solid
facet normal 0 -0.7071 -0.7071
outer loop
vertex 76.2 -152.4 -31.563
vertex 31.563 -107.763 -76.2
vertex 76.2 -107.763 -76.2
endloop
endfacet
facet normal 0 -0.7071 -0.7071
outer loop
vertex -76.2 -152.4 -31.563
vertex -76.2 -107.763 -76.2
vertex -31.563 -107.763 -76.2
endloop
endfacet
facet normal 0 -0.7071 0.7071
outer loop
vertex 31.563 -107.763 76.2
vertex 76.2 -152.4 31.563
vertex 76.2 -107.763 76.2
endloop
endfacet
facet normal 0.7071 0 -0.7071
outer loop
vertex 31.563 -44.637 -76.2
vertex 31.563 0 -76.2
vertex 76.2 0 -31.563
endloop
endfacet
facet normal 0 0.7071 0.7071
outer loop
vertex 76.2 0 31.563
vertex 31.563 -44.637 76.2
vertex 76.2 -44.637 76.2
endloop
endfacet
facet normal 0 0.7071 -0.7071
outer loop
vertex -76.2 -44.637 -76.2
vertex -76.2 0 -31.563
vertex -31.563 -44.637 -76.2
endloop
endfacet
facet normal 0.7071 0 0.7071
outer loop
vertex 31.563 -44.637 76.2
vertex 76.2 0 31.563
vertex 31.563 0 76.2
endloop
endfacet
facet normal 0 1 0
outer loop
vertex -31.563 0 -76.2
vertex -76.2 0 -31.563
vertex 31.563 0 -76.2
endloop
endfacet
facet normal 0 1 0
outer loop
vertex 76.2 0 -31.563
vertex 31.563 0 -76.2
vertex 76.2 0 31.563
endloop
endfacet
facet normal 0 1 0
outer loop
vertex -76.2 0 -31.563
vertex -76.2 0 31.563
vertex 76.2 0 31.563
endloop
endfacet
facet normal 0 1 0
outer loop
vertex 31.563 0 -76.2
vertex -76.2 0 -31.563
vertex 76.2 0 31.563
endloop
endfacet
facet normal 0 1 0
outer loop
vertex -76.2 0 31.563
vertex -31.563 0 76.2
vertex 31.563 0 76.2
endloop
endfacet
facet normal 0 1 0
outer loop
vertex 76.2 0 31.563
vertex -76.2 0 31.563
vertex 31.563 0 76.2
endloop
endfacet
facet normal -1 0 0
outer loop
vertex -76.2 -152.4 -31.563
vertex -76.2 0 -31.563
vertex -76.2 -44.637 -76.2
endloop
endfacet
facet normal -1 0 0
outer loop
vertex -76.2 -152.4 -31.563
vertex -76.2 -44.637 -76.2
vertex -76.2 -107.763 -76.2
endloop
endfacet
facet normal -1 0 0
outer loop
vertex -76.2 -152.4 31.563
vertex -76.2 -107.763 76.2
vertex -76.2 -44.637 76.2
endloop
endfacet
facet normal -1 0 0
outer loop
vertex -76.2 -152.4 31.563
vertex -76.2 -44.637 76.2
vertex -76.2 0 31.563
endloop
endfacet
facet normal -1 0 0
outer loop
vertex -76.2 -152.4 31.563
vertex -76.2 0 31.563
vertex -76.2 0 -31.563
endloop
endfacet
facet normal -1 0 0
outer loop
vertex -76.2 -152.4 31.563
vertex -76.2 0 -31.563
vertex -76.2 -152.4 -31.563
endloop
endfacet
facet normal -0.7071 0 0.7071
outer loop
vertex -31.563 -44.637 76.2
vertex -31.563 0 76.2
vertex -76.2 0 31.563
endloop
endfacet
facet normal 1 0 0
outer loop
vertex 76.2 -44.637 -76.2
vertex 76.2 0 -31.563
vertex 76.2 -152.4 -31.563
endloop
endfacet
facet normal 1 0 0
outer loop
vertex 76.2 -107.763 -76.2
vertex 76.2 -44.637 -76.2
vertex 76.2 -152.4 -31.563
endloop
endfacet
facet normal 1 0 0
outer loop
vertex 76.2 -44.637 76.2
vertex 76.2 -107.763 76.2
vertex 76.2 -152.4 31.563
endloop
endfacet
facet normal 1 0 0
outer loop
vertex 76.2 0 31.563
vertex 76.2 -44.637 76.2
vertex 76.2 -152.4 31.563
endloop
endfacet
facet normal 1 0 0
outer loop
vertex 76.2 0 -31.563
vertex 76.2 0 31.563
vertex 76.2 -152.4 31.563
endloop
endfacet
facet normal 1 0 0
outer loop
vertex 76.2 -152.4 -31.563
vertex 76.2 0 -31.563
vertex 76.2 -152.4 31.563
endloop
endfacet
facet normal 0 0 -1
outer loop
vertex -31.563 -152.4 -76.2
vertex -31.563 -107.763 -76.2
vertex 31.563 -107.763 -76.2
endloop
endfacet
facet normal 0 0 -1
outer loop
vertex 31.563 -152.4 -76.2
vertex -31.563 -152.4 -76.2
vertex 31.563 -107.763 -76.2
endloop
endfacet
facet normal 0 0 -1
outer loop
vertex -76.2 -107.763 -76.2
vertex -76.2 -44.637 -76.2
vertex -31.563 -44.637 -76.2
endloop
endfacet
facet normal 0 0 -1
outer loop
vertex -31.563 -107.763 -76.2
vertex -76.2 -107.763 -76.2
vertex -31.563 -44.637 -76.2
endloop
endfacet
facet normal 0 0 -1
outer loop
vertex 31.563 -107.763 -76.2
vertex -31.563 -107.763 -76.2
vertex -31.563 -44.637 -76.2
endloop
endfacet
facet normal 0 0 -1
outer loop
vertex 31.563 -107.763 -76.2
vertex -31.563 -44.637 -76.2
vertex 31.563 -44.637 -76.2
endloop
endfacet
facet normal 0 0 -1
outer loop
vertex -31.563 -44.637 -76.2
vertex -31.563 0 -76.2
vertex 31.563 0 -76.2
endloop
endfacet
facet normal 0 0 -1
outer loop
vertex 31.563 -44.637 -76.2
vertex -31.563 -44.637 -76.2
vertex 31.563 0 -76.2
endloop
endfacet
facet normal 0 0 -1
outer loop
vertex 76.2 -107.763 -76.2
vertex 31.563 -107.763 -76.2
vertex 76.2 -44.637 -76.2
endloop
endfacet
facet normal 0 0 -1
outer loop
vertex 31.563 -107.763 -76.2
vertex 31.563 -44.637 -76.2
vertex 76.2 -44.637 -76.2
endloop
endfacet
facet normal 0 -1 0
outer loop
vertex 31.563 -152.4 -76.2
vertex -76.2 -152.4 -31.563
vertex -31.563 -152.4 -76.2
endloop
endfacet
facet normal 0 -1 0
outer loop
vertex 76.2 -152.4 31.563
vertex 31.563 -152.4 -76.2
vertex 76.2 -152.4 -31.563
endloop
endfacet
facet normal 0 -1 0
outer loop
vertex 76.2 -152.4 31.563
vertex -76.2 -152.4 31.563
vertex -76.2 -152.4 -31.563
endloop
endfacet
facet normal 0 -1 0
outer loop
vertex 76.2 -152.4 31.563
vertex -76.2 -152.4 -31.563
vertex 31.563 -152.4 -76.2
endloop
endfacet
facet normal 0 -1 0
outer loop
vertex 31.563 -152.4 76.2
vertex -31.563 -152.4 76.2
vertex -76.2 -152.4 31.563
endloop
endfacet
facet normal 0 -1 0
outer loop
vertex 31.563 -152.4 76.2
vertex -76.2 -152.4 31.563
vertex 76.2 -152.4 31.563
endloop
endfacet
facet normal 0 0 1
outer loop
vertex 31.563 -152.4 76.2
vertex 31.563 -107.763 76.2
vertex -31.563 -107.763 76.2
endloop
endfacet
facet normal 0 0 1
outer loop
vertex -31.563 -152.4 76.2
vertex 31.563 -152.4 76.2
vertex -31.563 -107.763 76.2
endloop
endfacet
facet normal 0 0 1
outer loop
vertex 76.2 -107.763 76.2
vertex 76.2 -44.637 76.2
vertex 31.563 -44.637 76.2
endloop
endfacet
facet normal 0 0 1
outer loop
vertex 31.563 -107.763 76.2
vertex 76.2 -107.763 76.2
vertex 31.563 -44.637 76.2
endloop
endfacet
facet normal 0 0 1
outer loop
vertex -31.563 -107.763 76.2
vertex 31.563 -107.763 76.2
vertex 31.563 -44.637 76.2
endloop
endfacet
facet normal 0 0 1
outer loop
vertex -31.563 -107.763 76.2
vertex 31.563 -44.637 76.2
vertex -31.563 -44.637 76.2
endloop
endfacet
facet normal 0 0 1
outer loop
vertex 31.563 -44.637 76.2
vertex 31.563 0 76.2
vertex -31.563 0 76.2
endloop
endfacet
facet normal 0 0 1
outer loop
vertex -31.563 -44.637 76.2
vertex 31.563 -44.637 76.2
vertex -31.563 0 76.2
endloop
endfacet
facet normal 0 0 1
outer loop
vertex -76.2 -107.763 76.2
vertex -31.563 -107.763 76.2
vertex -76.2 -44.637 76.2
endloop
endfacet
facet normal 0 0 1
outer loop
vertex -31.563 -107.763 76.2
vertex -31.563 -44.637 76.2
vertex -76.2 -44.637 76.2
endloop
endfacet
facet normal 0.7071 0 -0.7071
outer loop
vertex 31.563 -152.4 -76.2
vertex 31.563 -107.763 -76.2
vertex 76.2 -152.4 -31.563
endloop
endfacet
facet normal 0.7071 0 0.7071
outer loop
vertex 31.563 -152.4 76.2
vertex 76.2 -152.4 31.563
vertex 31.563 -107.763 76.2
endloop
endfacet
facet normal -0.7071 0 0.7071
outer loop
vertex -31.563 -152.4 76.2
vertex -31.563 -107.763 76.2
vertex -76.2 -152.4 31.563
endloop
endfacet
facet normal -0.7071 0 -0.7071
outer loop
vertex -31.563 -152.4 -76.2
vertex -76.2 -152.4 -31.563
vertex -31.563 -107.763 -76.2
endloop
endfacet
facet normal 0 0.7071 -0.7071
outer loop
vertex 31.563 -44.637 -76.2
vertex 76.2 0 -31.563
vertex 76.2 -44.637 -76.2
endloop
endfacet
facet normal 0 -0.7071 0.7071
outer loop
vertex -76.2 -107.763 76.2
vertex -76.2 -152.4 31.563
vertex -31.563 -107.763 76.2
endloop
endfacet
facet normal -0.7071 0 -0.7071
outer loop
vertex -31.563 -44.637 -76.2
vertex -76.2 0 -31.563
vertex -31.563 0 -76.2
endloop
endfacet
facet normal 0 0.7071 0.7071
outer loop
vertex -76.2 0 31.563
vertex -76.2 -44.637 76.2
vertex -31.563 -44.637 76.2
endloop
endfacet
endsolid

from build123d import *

# Parameters (mm, degrees)
F1_DEPTH = 152.4
F2_W     = 76.2
F2_H     = 31.5630734528
F3_DEPTH = 152.4


with BuildPart() as f1:
    # F0 (on Front) → F1 (new body)
    with BuildSketch(Plane.XZ):
        Polygon((-31.5630734528, -76.2), (31.5630734528, -76.2), (76.2, -31.5630734528), (76.2, 31.5630734528), (31.5630734528, 76.2), (-31.5630734528, 76.2), (-76.2, 31.5630734528), (-76.2, -31.5630734528), align=None)
    extrude(amount=F1_DEPTH)

    # F2 (on face) → F3 (join)
    with BuildSketch(Plane(origin=(-76.2, 0, 0), x_dir=(0, -1, 0), z_dir=(-1, 0, 0))):
        Polygon((152.4, -31.5630734528), (76.2, -31.5630734528), (76.2, -76.2), (107.7630734528, -76.2), align=None)
        Polygon((76.2, -31.5630734528), (0, -31.5630734528), (44.6369265472, -76.2), (76.2, -76.2), align=None)
        with Locations((38.1, -15.7815367264)):
            Rectangle(F2_W, F2_H)
        with Locations((114.3, -15.7815367264)):
            Rectangle(F2_W, F2_H)
        Polygon((0, 31.5630734528), (0, 0), (76.2, 0), (152.4, 0), (152.4, 31.5630734528), align=None)
        Polygon((44.6369265472, 76.2), (0, 31.5630734528), (152.4, 31.5630734528), (107.7630734528, 76.2), align=None)
    extrude(amount=-F3_DEPTH)


solid = f1.part
